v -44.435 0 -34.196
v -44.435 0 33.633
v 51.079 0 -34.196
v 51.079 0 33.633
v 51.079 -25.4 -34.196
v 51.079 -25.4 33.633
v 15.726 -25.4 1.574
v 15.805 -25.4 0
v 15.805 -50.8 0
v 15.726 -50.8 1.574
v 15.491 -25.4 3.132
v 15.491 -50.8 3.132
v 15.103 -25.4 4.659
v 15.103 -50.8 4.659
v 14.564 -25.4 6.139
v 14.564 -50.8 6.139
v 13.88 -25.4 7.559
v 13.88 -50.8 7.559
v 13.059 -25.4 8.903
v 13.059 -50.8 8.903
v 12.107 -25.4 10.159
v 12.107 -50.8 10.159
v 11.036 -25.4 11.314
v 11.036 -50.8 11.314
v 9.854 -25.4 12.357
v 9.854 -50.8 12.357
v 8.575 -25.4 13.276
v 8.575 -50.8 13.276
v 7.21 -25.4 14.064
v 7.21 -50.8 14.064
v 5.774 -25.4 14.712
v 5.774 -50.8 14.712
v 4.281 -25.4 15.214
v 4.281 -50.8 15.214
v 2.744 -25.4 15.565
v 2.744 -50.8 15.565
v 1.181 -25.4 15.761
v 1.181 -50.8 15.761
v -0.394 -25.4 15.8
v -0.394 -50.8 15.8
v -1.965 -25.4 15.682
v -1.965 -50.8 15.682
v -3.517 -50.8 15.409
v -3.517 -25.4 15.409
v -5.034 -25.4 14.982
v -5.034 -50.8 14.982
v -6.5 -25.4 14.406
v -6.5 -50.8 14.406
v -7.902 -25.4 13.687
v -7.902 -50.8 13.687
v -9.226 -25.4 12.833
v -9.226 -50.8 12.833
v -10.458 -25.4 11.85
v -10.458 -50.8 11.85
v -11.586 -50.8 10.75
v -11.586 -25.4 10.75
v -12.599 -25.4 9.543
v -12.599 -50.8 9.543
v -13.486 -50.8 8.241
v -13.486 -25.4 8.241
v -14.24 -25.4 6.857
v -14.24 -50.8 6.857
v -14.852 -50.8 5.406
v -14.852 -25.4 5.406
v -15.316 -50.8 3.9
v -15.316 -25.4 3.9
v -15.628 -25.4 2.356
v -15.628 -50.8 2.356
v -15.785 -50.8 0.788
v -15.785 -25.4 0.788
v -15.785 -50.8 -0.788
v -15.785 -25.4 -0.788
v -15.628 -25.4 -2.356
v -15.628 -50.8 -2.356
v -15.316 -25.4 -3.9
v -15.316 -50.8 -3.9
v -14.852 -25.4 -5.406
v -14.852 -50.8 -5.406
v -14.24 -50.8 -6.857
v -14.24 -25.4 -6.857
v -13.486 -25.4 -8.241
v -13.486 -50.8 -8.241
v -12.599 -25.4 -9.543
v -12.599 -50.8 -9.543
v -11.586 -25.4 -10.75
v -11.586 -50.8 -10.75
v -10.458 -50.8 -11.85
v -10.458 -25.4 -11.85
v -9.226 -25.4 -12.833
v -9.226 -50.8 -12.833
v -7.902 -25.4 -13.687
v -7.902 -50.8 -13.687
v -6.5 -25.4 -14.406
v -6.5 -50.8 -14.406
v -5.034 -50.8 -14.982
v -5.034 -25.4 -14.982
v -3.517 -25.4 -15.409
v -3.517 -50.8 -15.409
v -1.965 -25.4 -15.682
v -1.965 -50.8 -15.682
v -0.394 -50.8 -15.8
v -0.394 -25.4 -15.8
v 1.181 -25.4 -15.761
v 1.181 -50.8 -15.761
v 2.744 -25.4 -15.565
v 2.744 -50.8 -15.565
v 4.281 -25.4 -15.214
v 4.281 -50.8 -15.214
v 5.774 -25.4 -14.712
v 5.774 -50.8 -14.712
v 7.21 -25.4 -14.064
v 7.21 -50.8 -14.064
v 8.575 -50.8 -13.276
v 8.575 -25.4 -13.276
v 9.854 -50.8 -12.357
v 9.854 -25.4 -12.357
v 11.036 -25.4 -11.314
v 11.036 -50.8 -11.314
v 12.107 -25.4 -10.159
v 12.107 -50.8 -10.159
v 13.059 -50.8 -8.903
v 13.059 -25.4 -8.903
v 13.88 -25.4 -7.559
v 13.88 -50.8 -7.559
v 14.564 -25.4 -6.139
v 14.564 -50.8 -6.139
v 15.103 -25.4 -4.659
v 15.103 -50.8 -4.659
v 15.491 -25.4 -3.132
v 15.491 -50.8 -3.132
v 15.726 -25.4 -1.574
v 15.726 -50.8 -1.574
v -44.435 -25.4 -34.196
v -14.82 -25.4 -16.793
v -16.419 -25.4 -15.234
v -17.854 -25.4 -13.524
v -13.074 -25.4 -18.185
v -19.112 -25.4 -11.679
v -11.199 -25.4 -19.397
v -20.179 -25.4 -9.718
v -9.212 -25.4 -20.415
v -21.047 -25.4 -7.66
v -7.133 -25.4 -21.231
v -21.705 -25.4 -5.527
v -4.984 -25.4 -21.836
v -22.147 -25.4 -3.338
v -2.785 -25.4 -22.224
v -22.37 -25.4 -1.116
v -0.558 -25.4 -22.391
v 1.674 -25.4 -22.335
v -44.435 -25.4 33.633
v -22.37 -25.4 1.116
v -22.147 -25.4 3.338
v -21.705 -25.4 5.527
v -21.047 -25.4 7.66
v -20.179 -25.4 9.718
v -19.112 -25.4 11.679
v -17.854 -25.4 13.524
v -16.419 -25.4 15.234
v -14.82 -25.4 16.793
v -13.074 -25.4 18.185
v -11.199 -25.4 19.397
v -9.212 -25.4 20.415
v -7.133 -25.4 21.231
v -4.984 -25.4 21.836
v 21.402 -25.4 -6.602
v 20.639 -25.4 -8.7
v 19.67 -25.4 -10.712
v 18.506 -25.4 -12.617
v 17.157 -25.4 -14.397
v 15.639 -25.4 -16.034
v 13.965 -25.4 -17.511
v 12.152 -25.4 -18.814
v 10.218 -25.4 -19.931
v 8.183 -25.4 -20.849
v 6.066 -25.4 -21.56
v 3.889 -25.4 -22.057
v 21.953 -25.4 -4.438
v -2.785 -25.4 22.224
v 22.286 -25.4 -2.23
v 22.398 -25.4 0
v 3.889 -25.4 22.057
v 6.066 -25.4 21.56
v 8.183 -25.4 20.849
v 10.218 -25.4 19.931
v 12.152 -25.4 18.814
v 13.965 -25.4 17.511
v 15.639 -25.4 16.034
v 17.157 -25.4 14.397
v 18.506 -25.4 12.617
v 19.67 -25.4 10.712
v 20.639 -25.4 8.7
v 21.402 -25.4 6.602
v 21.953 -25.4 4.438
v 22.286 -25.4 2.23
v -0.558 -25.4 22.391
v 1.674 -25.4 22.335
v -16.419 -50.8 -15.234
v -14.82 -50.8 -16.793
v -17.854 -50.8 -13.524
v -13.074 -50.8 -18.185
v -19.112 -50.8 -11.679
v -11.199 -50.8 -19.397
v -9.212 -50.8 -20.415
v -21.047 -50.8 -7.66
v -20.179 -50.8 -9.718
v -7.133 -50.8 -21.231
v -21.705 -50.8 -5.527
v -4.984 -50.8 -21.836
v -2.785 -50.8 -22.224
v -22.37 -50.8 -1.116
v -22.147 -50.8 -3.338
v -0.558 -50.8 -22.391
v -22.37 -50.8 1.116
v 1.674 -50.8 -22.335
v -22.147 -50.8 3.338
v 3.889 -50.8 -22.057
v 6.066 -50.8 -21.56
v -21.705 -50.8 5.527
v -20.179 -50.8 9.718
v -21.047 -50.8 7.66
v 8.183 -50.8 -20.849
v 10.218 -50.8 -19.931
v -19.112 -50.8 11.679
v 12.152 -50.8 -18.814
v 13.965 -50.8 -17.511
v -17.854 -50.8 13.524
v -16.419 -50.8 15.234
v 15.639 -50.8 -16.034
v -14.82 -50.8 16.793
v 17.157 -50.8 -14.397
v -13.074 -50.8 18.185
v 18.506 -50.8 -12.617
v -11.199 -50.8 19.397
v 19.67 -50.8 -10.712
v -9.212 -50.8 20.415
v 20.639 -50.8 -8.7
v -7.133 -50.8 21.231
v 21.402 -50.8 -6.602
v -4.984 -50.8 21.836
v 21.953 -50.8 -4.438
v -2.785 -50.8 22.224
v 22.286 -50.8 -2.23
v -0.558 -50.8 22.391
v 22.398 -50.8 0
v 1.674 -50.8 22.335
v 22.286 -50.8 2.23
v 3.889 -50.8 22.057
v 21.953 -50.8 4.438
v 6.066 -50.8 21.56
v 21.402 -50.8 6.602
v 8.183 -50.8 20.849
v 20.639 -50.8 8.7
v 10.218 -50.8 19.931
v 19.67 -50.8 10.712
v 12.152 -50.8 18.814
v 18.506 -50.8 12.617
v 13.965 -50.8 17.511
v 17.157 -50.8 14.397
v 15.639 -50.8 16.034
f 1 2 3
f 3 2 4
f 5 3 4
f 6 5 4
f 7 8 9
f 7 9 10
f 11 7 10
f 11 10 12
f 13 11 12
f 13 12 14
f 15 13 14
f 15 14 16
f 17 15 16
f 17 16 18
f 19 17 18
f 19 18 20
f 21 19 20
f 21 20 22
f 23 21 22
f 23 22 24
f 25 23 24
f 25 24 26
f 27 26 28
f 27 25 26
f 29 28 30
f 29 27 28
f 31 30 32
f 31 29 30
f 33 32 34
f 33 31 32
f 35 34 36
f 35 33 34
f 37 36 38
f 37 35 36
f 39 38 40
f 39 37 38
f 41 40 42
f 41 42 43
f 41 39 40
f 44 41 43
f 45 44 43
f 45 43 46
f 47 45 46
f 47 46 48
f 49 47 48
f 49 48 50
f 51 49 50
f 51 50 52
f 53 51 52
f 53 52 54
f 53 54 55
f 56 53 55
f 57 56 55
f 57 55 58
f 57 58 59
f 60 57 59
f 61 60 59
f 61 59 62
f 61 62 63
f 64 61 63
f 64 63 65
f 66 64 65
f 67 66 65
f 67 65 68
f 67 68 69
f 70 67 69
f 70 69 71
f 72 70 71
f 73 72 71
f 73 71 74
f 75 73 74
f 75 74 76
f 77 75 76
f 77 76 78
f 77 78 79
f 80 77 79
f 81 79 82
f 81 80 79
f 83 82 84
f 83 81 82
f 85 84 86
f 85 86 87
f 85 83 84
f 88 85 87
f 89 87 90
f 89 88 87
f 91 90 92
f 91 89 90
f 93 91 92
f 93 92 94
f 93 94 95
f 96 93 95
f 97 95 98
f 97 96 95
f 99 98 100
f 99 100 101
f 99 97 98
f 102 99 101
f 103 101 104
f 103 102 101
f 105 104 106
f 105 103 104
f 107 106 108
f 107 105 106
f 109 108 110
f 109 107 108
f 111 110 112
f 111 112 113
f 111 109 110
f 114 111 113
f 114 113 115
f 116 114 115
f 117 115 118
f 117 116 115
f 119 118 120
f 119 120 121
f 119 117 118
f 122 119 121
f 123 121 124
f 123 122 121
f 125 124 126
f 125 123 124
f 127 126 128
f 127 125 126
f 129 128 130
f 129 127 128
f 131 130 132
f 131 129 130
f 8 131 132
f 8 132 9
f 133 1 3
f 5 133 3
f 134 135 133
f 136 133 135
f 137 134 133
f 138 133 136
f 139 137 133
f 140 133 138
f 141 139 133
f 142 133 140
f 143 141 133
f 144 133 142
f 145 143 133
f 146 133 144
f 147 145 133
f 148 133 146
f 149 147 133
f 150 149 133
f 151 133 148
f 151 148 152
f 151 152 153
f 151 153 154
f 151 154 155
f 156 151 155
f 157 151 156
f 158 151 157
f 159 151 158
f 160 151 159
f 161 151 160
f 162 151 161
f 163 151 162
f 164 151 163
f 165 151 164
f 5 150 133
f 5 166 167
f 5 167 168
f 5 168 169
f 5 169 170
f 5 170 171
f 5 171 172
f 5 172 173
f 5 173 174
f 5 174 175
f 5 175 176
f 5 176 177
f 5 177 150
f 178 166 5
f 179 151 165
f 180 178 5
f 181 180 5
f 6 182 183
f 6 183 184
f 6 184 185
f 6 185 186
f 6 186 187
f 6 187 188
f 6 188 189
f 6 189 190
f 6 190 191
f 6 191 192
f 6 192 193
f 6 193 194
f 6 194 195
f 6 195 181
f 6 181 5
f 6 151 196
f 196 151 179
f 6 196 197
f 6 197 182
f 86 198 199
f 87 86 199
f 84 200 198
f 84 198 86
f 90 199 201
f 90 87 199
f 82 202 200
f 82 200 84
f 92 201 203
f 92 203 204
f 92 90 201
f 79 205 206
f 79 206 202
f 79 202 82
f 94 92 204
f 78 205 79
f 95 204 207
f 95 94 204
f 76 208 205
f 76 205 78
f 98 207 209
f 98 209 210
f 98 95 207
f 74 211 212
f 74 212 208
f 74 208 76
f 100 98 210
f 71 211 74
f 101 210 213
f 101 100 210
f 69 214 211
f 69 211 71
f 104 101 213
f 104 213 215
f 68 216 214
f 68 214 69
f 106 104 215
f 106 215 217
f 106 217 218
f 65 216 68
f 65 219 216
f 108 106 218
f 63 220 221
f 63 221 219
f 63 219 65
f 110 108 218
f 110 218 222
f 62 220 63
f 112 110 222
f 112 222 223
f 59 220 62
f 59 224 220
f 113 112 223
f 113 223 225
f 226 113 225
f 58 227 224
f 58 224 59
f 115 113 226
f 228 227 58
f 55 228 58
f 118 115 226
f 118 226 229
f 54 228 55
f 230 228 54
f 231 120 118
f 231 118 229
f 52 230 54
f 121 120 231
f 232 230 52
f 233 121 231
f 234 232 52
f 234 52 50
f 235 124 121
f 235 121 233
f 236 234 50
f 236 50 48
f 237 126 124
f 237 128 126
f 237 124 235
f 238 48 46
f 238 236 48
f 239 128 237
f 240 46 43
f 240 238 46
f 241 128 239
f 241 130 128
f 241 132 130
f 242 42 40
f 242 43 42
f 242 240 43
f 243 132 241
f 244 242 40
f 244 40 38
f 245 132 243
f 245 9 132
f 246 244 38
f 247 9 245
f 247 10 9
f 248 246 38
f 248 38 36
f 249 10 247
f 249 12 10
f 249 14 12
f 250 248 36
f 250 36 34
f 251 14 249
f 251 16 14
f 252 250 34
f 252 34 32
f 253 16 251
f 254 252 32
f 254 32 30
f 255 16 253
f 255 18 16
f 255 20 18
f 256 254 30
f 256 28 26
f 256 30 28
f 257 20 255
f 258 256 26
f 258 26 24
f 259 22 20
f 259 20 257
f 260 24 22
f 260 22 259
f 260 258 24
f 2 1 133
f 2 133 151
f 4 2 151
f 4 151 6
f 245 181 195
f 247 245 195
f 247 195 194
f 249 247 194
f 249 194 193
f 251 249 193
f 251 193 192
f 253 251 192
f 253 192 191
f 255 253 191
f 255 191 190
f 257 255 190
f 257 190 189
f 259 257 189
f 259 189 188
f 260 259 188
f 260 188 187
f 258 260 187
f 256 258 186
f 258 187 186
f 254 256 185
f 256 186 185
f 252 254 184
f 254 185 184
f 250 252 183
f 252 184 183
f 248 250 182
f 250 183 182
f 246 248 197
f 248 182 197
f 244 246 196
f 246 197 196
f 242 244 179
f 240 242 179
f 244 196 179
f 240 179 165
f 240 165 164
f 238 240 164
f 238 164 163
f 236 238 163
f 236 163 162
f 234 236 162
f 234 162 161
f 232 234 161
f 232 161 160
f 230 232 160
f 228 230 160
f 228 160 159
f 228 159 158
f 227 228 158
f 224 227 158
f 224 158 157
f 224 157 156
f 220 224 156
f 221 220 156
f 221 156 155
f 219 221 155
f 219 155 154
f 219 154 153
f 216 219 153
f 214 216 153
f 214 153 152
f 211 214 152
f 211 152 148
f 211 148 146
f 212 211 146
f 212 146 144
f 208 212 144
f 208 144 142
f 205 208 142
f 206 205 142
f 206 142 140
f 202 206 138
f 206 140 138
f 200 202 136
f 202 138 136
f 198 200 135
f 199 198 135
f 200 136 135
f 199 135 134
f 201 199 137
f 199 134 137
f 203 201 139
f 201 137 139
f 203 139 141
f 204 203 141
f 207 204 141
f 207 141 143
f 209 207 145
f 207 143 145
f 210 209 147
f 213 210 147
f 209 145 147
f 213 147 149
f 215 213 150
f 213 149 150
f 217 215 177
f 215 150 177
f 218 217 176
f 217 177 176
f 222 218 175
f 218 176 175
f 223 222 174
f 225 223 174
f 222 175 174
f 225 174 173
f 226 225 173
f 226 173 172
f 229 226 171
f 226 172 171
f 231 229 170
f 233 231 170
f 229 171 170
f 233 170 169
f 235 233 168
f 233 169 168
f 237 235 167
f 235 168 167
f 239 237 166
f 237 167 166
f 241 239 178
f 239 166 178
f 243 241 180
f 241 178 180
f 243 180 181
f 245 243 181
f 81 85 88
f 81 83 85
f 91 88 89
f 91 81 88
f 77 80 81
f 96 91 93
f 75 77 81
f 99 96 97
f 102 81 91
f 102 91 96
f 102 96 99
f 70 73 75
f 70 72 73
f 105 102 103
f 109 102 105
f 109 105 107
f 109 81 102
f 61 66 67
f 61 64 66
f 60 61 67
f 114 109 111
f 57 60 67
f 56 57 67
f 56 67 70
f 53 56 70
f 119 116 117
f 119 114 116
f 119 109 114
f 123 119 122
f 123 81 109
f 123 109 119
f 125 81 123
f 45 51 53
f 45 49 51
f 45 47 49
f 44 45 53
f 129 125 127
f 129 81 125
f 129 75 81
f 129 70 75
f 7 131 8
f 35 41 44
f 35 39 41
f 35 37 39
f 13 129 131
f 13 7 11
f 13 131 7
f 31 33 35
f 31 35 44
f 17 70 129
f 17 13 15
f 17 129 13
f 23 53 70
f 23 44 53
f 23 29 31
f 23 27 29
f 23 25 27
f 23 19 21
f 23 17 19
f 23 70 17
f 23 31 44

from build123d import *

# Parameters (mm, degrees)
F0_R     = 22.39752
F0_R_2   = 15.804848
F1_DEPTH = 50.8
F2_W     = 95.513668
F2_H     = 67.828547
F3_DEPTH = 25.4


with BuildPart() as f1:
    # F0 (on Front) → F1 (new body)
    with BuildSketch(Plane.XZ):
        Circle(F0_R)
        Circle(F0_R_2, mode=Mode.SUBTRACT)
    extrude(amount=F1_DEPTH)

    # F2 (on Front) → F3 (join)
    with BuildSketch(Plane.XZ):
        with Locations((3.322212, -0.281336)):
            Rectangle(F2_W, F2_H)
    extrude(amount=F3_DEPTH)


solid = f1.part
